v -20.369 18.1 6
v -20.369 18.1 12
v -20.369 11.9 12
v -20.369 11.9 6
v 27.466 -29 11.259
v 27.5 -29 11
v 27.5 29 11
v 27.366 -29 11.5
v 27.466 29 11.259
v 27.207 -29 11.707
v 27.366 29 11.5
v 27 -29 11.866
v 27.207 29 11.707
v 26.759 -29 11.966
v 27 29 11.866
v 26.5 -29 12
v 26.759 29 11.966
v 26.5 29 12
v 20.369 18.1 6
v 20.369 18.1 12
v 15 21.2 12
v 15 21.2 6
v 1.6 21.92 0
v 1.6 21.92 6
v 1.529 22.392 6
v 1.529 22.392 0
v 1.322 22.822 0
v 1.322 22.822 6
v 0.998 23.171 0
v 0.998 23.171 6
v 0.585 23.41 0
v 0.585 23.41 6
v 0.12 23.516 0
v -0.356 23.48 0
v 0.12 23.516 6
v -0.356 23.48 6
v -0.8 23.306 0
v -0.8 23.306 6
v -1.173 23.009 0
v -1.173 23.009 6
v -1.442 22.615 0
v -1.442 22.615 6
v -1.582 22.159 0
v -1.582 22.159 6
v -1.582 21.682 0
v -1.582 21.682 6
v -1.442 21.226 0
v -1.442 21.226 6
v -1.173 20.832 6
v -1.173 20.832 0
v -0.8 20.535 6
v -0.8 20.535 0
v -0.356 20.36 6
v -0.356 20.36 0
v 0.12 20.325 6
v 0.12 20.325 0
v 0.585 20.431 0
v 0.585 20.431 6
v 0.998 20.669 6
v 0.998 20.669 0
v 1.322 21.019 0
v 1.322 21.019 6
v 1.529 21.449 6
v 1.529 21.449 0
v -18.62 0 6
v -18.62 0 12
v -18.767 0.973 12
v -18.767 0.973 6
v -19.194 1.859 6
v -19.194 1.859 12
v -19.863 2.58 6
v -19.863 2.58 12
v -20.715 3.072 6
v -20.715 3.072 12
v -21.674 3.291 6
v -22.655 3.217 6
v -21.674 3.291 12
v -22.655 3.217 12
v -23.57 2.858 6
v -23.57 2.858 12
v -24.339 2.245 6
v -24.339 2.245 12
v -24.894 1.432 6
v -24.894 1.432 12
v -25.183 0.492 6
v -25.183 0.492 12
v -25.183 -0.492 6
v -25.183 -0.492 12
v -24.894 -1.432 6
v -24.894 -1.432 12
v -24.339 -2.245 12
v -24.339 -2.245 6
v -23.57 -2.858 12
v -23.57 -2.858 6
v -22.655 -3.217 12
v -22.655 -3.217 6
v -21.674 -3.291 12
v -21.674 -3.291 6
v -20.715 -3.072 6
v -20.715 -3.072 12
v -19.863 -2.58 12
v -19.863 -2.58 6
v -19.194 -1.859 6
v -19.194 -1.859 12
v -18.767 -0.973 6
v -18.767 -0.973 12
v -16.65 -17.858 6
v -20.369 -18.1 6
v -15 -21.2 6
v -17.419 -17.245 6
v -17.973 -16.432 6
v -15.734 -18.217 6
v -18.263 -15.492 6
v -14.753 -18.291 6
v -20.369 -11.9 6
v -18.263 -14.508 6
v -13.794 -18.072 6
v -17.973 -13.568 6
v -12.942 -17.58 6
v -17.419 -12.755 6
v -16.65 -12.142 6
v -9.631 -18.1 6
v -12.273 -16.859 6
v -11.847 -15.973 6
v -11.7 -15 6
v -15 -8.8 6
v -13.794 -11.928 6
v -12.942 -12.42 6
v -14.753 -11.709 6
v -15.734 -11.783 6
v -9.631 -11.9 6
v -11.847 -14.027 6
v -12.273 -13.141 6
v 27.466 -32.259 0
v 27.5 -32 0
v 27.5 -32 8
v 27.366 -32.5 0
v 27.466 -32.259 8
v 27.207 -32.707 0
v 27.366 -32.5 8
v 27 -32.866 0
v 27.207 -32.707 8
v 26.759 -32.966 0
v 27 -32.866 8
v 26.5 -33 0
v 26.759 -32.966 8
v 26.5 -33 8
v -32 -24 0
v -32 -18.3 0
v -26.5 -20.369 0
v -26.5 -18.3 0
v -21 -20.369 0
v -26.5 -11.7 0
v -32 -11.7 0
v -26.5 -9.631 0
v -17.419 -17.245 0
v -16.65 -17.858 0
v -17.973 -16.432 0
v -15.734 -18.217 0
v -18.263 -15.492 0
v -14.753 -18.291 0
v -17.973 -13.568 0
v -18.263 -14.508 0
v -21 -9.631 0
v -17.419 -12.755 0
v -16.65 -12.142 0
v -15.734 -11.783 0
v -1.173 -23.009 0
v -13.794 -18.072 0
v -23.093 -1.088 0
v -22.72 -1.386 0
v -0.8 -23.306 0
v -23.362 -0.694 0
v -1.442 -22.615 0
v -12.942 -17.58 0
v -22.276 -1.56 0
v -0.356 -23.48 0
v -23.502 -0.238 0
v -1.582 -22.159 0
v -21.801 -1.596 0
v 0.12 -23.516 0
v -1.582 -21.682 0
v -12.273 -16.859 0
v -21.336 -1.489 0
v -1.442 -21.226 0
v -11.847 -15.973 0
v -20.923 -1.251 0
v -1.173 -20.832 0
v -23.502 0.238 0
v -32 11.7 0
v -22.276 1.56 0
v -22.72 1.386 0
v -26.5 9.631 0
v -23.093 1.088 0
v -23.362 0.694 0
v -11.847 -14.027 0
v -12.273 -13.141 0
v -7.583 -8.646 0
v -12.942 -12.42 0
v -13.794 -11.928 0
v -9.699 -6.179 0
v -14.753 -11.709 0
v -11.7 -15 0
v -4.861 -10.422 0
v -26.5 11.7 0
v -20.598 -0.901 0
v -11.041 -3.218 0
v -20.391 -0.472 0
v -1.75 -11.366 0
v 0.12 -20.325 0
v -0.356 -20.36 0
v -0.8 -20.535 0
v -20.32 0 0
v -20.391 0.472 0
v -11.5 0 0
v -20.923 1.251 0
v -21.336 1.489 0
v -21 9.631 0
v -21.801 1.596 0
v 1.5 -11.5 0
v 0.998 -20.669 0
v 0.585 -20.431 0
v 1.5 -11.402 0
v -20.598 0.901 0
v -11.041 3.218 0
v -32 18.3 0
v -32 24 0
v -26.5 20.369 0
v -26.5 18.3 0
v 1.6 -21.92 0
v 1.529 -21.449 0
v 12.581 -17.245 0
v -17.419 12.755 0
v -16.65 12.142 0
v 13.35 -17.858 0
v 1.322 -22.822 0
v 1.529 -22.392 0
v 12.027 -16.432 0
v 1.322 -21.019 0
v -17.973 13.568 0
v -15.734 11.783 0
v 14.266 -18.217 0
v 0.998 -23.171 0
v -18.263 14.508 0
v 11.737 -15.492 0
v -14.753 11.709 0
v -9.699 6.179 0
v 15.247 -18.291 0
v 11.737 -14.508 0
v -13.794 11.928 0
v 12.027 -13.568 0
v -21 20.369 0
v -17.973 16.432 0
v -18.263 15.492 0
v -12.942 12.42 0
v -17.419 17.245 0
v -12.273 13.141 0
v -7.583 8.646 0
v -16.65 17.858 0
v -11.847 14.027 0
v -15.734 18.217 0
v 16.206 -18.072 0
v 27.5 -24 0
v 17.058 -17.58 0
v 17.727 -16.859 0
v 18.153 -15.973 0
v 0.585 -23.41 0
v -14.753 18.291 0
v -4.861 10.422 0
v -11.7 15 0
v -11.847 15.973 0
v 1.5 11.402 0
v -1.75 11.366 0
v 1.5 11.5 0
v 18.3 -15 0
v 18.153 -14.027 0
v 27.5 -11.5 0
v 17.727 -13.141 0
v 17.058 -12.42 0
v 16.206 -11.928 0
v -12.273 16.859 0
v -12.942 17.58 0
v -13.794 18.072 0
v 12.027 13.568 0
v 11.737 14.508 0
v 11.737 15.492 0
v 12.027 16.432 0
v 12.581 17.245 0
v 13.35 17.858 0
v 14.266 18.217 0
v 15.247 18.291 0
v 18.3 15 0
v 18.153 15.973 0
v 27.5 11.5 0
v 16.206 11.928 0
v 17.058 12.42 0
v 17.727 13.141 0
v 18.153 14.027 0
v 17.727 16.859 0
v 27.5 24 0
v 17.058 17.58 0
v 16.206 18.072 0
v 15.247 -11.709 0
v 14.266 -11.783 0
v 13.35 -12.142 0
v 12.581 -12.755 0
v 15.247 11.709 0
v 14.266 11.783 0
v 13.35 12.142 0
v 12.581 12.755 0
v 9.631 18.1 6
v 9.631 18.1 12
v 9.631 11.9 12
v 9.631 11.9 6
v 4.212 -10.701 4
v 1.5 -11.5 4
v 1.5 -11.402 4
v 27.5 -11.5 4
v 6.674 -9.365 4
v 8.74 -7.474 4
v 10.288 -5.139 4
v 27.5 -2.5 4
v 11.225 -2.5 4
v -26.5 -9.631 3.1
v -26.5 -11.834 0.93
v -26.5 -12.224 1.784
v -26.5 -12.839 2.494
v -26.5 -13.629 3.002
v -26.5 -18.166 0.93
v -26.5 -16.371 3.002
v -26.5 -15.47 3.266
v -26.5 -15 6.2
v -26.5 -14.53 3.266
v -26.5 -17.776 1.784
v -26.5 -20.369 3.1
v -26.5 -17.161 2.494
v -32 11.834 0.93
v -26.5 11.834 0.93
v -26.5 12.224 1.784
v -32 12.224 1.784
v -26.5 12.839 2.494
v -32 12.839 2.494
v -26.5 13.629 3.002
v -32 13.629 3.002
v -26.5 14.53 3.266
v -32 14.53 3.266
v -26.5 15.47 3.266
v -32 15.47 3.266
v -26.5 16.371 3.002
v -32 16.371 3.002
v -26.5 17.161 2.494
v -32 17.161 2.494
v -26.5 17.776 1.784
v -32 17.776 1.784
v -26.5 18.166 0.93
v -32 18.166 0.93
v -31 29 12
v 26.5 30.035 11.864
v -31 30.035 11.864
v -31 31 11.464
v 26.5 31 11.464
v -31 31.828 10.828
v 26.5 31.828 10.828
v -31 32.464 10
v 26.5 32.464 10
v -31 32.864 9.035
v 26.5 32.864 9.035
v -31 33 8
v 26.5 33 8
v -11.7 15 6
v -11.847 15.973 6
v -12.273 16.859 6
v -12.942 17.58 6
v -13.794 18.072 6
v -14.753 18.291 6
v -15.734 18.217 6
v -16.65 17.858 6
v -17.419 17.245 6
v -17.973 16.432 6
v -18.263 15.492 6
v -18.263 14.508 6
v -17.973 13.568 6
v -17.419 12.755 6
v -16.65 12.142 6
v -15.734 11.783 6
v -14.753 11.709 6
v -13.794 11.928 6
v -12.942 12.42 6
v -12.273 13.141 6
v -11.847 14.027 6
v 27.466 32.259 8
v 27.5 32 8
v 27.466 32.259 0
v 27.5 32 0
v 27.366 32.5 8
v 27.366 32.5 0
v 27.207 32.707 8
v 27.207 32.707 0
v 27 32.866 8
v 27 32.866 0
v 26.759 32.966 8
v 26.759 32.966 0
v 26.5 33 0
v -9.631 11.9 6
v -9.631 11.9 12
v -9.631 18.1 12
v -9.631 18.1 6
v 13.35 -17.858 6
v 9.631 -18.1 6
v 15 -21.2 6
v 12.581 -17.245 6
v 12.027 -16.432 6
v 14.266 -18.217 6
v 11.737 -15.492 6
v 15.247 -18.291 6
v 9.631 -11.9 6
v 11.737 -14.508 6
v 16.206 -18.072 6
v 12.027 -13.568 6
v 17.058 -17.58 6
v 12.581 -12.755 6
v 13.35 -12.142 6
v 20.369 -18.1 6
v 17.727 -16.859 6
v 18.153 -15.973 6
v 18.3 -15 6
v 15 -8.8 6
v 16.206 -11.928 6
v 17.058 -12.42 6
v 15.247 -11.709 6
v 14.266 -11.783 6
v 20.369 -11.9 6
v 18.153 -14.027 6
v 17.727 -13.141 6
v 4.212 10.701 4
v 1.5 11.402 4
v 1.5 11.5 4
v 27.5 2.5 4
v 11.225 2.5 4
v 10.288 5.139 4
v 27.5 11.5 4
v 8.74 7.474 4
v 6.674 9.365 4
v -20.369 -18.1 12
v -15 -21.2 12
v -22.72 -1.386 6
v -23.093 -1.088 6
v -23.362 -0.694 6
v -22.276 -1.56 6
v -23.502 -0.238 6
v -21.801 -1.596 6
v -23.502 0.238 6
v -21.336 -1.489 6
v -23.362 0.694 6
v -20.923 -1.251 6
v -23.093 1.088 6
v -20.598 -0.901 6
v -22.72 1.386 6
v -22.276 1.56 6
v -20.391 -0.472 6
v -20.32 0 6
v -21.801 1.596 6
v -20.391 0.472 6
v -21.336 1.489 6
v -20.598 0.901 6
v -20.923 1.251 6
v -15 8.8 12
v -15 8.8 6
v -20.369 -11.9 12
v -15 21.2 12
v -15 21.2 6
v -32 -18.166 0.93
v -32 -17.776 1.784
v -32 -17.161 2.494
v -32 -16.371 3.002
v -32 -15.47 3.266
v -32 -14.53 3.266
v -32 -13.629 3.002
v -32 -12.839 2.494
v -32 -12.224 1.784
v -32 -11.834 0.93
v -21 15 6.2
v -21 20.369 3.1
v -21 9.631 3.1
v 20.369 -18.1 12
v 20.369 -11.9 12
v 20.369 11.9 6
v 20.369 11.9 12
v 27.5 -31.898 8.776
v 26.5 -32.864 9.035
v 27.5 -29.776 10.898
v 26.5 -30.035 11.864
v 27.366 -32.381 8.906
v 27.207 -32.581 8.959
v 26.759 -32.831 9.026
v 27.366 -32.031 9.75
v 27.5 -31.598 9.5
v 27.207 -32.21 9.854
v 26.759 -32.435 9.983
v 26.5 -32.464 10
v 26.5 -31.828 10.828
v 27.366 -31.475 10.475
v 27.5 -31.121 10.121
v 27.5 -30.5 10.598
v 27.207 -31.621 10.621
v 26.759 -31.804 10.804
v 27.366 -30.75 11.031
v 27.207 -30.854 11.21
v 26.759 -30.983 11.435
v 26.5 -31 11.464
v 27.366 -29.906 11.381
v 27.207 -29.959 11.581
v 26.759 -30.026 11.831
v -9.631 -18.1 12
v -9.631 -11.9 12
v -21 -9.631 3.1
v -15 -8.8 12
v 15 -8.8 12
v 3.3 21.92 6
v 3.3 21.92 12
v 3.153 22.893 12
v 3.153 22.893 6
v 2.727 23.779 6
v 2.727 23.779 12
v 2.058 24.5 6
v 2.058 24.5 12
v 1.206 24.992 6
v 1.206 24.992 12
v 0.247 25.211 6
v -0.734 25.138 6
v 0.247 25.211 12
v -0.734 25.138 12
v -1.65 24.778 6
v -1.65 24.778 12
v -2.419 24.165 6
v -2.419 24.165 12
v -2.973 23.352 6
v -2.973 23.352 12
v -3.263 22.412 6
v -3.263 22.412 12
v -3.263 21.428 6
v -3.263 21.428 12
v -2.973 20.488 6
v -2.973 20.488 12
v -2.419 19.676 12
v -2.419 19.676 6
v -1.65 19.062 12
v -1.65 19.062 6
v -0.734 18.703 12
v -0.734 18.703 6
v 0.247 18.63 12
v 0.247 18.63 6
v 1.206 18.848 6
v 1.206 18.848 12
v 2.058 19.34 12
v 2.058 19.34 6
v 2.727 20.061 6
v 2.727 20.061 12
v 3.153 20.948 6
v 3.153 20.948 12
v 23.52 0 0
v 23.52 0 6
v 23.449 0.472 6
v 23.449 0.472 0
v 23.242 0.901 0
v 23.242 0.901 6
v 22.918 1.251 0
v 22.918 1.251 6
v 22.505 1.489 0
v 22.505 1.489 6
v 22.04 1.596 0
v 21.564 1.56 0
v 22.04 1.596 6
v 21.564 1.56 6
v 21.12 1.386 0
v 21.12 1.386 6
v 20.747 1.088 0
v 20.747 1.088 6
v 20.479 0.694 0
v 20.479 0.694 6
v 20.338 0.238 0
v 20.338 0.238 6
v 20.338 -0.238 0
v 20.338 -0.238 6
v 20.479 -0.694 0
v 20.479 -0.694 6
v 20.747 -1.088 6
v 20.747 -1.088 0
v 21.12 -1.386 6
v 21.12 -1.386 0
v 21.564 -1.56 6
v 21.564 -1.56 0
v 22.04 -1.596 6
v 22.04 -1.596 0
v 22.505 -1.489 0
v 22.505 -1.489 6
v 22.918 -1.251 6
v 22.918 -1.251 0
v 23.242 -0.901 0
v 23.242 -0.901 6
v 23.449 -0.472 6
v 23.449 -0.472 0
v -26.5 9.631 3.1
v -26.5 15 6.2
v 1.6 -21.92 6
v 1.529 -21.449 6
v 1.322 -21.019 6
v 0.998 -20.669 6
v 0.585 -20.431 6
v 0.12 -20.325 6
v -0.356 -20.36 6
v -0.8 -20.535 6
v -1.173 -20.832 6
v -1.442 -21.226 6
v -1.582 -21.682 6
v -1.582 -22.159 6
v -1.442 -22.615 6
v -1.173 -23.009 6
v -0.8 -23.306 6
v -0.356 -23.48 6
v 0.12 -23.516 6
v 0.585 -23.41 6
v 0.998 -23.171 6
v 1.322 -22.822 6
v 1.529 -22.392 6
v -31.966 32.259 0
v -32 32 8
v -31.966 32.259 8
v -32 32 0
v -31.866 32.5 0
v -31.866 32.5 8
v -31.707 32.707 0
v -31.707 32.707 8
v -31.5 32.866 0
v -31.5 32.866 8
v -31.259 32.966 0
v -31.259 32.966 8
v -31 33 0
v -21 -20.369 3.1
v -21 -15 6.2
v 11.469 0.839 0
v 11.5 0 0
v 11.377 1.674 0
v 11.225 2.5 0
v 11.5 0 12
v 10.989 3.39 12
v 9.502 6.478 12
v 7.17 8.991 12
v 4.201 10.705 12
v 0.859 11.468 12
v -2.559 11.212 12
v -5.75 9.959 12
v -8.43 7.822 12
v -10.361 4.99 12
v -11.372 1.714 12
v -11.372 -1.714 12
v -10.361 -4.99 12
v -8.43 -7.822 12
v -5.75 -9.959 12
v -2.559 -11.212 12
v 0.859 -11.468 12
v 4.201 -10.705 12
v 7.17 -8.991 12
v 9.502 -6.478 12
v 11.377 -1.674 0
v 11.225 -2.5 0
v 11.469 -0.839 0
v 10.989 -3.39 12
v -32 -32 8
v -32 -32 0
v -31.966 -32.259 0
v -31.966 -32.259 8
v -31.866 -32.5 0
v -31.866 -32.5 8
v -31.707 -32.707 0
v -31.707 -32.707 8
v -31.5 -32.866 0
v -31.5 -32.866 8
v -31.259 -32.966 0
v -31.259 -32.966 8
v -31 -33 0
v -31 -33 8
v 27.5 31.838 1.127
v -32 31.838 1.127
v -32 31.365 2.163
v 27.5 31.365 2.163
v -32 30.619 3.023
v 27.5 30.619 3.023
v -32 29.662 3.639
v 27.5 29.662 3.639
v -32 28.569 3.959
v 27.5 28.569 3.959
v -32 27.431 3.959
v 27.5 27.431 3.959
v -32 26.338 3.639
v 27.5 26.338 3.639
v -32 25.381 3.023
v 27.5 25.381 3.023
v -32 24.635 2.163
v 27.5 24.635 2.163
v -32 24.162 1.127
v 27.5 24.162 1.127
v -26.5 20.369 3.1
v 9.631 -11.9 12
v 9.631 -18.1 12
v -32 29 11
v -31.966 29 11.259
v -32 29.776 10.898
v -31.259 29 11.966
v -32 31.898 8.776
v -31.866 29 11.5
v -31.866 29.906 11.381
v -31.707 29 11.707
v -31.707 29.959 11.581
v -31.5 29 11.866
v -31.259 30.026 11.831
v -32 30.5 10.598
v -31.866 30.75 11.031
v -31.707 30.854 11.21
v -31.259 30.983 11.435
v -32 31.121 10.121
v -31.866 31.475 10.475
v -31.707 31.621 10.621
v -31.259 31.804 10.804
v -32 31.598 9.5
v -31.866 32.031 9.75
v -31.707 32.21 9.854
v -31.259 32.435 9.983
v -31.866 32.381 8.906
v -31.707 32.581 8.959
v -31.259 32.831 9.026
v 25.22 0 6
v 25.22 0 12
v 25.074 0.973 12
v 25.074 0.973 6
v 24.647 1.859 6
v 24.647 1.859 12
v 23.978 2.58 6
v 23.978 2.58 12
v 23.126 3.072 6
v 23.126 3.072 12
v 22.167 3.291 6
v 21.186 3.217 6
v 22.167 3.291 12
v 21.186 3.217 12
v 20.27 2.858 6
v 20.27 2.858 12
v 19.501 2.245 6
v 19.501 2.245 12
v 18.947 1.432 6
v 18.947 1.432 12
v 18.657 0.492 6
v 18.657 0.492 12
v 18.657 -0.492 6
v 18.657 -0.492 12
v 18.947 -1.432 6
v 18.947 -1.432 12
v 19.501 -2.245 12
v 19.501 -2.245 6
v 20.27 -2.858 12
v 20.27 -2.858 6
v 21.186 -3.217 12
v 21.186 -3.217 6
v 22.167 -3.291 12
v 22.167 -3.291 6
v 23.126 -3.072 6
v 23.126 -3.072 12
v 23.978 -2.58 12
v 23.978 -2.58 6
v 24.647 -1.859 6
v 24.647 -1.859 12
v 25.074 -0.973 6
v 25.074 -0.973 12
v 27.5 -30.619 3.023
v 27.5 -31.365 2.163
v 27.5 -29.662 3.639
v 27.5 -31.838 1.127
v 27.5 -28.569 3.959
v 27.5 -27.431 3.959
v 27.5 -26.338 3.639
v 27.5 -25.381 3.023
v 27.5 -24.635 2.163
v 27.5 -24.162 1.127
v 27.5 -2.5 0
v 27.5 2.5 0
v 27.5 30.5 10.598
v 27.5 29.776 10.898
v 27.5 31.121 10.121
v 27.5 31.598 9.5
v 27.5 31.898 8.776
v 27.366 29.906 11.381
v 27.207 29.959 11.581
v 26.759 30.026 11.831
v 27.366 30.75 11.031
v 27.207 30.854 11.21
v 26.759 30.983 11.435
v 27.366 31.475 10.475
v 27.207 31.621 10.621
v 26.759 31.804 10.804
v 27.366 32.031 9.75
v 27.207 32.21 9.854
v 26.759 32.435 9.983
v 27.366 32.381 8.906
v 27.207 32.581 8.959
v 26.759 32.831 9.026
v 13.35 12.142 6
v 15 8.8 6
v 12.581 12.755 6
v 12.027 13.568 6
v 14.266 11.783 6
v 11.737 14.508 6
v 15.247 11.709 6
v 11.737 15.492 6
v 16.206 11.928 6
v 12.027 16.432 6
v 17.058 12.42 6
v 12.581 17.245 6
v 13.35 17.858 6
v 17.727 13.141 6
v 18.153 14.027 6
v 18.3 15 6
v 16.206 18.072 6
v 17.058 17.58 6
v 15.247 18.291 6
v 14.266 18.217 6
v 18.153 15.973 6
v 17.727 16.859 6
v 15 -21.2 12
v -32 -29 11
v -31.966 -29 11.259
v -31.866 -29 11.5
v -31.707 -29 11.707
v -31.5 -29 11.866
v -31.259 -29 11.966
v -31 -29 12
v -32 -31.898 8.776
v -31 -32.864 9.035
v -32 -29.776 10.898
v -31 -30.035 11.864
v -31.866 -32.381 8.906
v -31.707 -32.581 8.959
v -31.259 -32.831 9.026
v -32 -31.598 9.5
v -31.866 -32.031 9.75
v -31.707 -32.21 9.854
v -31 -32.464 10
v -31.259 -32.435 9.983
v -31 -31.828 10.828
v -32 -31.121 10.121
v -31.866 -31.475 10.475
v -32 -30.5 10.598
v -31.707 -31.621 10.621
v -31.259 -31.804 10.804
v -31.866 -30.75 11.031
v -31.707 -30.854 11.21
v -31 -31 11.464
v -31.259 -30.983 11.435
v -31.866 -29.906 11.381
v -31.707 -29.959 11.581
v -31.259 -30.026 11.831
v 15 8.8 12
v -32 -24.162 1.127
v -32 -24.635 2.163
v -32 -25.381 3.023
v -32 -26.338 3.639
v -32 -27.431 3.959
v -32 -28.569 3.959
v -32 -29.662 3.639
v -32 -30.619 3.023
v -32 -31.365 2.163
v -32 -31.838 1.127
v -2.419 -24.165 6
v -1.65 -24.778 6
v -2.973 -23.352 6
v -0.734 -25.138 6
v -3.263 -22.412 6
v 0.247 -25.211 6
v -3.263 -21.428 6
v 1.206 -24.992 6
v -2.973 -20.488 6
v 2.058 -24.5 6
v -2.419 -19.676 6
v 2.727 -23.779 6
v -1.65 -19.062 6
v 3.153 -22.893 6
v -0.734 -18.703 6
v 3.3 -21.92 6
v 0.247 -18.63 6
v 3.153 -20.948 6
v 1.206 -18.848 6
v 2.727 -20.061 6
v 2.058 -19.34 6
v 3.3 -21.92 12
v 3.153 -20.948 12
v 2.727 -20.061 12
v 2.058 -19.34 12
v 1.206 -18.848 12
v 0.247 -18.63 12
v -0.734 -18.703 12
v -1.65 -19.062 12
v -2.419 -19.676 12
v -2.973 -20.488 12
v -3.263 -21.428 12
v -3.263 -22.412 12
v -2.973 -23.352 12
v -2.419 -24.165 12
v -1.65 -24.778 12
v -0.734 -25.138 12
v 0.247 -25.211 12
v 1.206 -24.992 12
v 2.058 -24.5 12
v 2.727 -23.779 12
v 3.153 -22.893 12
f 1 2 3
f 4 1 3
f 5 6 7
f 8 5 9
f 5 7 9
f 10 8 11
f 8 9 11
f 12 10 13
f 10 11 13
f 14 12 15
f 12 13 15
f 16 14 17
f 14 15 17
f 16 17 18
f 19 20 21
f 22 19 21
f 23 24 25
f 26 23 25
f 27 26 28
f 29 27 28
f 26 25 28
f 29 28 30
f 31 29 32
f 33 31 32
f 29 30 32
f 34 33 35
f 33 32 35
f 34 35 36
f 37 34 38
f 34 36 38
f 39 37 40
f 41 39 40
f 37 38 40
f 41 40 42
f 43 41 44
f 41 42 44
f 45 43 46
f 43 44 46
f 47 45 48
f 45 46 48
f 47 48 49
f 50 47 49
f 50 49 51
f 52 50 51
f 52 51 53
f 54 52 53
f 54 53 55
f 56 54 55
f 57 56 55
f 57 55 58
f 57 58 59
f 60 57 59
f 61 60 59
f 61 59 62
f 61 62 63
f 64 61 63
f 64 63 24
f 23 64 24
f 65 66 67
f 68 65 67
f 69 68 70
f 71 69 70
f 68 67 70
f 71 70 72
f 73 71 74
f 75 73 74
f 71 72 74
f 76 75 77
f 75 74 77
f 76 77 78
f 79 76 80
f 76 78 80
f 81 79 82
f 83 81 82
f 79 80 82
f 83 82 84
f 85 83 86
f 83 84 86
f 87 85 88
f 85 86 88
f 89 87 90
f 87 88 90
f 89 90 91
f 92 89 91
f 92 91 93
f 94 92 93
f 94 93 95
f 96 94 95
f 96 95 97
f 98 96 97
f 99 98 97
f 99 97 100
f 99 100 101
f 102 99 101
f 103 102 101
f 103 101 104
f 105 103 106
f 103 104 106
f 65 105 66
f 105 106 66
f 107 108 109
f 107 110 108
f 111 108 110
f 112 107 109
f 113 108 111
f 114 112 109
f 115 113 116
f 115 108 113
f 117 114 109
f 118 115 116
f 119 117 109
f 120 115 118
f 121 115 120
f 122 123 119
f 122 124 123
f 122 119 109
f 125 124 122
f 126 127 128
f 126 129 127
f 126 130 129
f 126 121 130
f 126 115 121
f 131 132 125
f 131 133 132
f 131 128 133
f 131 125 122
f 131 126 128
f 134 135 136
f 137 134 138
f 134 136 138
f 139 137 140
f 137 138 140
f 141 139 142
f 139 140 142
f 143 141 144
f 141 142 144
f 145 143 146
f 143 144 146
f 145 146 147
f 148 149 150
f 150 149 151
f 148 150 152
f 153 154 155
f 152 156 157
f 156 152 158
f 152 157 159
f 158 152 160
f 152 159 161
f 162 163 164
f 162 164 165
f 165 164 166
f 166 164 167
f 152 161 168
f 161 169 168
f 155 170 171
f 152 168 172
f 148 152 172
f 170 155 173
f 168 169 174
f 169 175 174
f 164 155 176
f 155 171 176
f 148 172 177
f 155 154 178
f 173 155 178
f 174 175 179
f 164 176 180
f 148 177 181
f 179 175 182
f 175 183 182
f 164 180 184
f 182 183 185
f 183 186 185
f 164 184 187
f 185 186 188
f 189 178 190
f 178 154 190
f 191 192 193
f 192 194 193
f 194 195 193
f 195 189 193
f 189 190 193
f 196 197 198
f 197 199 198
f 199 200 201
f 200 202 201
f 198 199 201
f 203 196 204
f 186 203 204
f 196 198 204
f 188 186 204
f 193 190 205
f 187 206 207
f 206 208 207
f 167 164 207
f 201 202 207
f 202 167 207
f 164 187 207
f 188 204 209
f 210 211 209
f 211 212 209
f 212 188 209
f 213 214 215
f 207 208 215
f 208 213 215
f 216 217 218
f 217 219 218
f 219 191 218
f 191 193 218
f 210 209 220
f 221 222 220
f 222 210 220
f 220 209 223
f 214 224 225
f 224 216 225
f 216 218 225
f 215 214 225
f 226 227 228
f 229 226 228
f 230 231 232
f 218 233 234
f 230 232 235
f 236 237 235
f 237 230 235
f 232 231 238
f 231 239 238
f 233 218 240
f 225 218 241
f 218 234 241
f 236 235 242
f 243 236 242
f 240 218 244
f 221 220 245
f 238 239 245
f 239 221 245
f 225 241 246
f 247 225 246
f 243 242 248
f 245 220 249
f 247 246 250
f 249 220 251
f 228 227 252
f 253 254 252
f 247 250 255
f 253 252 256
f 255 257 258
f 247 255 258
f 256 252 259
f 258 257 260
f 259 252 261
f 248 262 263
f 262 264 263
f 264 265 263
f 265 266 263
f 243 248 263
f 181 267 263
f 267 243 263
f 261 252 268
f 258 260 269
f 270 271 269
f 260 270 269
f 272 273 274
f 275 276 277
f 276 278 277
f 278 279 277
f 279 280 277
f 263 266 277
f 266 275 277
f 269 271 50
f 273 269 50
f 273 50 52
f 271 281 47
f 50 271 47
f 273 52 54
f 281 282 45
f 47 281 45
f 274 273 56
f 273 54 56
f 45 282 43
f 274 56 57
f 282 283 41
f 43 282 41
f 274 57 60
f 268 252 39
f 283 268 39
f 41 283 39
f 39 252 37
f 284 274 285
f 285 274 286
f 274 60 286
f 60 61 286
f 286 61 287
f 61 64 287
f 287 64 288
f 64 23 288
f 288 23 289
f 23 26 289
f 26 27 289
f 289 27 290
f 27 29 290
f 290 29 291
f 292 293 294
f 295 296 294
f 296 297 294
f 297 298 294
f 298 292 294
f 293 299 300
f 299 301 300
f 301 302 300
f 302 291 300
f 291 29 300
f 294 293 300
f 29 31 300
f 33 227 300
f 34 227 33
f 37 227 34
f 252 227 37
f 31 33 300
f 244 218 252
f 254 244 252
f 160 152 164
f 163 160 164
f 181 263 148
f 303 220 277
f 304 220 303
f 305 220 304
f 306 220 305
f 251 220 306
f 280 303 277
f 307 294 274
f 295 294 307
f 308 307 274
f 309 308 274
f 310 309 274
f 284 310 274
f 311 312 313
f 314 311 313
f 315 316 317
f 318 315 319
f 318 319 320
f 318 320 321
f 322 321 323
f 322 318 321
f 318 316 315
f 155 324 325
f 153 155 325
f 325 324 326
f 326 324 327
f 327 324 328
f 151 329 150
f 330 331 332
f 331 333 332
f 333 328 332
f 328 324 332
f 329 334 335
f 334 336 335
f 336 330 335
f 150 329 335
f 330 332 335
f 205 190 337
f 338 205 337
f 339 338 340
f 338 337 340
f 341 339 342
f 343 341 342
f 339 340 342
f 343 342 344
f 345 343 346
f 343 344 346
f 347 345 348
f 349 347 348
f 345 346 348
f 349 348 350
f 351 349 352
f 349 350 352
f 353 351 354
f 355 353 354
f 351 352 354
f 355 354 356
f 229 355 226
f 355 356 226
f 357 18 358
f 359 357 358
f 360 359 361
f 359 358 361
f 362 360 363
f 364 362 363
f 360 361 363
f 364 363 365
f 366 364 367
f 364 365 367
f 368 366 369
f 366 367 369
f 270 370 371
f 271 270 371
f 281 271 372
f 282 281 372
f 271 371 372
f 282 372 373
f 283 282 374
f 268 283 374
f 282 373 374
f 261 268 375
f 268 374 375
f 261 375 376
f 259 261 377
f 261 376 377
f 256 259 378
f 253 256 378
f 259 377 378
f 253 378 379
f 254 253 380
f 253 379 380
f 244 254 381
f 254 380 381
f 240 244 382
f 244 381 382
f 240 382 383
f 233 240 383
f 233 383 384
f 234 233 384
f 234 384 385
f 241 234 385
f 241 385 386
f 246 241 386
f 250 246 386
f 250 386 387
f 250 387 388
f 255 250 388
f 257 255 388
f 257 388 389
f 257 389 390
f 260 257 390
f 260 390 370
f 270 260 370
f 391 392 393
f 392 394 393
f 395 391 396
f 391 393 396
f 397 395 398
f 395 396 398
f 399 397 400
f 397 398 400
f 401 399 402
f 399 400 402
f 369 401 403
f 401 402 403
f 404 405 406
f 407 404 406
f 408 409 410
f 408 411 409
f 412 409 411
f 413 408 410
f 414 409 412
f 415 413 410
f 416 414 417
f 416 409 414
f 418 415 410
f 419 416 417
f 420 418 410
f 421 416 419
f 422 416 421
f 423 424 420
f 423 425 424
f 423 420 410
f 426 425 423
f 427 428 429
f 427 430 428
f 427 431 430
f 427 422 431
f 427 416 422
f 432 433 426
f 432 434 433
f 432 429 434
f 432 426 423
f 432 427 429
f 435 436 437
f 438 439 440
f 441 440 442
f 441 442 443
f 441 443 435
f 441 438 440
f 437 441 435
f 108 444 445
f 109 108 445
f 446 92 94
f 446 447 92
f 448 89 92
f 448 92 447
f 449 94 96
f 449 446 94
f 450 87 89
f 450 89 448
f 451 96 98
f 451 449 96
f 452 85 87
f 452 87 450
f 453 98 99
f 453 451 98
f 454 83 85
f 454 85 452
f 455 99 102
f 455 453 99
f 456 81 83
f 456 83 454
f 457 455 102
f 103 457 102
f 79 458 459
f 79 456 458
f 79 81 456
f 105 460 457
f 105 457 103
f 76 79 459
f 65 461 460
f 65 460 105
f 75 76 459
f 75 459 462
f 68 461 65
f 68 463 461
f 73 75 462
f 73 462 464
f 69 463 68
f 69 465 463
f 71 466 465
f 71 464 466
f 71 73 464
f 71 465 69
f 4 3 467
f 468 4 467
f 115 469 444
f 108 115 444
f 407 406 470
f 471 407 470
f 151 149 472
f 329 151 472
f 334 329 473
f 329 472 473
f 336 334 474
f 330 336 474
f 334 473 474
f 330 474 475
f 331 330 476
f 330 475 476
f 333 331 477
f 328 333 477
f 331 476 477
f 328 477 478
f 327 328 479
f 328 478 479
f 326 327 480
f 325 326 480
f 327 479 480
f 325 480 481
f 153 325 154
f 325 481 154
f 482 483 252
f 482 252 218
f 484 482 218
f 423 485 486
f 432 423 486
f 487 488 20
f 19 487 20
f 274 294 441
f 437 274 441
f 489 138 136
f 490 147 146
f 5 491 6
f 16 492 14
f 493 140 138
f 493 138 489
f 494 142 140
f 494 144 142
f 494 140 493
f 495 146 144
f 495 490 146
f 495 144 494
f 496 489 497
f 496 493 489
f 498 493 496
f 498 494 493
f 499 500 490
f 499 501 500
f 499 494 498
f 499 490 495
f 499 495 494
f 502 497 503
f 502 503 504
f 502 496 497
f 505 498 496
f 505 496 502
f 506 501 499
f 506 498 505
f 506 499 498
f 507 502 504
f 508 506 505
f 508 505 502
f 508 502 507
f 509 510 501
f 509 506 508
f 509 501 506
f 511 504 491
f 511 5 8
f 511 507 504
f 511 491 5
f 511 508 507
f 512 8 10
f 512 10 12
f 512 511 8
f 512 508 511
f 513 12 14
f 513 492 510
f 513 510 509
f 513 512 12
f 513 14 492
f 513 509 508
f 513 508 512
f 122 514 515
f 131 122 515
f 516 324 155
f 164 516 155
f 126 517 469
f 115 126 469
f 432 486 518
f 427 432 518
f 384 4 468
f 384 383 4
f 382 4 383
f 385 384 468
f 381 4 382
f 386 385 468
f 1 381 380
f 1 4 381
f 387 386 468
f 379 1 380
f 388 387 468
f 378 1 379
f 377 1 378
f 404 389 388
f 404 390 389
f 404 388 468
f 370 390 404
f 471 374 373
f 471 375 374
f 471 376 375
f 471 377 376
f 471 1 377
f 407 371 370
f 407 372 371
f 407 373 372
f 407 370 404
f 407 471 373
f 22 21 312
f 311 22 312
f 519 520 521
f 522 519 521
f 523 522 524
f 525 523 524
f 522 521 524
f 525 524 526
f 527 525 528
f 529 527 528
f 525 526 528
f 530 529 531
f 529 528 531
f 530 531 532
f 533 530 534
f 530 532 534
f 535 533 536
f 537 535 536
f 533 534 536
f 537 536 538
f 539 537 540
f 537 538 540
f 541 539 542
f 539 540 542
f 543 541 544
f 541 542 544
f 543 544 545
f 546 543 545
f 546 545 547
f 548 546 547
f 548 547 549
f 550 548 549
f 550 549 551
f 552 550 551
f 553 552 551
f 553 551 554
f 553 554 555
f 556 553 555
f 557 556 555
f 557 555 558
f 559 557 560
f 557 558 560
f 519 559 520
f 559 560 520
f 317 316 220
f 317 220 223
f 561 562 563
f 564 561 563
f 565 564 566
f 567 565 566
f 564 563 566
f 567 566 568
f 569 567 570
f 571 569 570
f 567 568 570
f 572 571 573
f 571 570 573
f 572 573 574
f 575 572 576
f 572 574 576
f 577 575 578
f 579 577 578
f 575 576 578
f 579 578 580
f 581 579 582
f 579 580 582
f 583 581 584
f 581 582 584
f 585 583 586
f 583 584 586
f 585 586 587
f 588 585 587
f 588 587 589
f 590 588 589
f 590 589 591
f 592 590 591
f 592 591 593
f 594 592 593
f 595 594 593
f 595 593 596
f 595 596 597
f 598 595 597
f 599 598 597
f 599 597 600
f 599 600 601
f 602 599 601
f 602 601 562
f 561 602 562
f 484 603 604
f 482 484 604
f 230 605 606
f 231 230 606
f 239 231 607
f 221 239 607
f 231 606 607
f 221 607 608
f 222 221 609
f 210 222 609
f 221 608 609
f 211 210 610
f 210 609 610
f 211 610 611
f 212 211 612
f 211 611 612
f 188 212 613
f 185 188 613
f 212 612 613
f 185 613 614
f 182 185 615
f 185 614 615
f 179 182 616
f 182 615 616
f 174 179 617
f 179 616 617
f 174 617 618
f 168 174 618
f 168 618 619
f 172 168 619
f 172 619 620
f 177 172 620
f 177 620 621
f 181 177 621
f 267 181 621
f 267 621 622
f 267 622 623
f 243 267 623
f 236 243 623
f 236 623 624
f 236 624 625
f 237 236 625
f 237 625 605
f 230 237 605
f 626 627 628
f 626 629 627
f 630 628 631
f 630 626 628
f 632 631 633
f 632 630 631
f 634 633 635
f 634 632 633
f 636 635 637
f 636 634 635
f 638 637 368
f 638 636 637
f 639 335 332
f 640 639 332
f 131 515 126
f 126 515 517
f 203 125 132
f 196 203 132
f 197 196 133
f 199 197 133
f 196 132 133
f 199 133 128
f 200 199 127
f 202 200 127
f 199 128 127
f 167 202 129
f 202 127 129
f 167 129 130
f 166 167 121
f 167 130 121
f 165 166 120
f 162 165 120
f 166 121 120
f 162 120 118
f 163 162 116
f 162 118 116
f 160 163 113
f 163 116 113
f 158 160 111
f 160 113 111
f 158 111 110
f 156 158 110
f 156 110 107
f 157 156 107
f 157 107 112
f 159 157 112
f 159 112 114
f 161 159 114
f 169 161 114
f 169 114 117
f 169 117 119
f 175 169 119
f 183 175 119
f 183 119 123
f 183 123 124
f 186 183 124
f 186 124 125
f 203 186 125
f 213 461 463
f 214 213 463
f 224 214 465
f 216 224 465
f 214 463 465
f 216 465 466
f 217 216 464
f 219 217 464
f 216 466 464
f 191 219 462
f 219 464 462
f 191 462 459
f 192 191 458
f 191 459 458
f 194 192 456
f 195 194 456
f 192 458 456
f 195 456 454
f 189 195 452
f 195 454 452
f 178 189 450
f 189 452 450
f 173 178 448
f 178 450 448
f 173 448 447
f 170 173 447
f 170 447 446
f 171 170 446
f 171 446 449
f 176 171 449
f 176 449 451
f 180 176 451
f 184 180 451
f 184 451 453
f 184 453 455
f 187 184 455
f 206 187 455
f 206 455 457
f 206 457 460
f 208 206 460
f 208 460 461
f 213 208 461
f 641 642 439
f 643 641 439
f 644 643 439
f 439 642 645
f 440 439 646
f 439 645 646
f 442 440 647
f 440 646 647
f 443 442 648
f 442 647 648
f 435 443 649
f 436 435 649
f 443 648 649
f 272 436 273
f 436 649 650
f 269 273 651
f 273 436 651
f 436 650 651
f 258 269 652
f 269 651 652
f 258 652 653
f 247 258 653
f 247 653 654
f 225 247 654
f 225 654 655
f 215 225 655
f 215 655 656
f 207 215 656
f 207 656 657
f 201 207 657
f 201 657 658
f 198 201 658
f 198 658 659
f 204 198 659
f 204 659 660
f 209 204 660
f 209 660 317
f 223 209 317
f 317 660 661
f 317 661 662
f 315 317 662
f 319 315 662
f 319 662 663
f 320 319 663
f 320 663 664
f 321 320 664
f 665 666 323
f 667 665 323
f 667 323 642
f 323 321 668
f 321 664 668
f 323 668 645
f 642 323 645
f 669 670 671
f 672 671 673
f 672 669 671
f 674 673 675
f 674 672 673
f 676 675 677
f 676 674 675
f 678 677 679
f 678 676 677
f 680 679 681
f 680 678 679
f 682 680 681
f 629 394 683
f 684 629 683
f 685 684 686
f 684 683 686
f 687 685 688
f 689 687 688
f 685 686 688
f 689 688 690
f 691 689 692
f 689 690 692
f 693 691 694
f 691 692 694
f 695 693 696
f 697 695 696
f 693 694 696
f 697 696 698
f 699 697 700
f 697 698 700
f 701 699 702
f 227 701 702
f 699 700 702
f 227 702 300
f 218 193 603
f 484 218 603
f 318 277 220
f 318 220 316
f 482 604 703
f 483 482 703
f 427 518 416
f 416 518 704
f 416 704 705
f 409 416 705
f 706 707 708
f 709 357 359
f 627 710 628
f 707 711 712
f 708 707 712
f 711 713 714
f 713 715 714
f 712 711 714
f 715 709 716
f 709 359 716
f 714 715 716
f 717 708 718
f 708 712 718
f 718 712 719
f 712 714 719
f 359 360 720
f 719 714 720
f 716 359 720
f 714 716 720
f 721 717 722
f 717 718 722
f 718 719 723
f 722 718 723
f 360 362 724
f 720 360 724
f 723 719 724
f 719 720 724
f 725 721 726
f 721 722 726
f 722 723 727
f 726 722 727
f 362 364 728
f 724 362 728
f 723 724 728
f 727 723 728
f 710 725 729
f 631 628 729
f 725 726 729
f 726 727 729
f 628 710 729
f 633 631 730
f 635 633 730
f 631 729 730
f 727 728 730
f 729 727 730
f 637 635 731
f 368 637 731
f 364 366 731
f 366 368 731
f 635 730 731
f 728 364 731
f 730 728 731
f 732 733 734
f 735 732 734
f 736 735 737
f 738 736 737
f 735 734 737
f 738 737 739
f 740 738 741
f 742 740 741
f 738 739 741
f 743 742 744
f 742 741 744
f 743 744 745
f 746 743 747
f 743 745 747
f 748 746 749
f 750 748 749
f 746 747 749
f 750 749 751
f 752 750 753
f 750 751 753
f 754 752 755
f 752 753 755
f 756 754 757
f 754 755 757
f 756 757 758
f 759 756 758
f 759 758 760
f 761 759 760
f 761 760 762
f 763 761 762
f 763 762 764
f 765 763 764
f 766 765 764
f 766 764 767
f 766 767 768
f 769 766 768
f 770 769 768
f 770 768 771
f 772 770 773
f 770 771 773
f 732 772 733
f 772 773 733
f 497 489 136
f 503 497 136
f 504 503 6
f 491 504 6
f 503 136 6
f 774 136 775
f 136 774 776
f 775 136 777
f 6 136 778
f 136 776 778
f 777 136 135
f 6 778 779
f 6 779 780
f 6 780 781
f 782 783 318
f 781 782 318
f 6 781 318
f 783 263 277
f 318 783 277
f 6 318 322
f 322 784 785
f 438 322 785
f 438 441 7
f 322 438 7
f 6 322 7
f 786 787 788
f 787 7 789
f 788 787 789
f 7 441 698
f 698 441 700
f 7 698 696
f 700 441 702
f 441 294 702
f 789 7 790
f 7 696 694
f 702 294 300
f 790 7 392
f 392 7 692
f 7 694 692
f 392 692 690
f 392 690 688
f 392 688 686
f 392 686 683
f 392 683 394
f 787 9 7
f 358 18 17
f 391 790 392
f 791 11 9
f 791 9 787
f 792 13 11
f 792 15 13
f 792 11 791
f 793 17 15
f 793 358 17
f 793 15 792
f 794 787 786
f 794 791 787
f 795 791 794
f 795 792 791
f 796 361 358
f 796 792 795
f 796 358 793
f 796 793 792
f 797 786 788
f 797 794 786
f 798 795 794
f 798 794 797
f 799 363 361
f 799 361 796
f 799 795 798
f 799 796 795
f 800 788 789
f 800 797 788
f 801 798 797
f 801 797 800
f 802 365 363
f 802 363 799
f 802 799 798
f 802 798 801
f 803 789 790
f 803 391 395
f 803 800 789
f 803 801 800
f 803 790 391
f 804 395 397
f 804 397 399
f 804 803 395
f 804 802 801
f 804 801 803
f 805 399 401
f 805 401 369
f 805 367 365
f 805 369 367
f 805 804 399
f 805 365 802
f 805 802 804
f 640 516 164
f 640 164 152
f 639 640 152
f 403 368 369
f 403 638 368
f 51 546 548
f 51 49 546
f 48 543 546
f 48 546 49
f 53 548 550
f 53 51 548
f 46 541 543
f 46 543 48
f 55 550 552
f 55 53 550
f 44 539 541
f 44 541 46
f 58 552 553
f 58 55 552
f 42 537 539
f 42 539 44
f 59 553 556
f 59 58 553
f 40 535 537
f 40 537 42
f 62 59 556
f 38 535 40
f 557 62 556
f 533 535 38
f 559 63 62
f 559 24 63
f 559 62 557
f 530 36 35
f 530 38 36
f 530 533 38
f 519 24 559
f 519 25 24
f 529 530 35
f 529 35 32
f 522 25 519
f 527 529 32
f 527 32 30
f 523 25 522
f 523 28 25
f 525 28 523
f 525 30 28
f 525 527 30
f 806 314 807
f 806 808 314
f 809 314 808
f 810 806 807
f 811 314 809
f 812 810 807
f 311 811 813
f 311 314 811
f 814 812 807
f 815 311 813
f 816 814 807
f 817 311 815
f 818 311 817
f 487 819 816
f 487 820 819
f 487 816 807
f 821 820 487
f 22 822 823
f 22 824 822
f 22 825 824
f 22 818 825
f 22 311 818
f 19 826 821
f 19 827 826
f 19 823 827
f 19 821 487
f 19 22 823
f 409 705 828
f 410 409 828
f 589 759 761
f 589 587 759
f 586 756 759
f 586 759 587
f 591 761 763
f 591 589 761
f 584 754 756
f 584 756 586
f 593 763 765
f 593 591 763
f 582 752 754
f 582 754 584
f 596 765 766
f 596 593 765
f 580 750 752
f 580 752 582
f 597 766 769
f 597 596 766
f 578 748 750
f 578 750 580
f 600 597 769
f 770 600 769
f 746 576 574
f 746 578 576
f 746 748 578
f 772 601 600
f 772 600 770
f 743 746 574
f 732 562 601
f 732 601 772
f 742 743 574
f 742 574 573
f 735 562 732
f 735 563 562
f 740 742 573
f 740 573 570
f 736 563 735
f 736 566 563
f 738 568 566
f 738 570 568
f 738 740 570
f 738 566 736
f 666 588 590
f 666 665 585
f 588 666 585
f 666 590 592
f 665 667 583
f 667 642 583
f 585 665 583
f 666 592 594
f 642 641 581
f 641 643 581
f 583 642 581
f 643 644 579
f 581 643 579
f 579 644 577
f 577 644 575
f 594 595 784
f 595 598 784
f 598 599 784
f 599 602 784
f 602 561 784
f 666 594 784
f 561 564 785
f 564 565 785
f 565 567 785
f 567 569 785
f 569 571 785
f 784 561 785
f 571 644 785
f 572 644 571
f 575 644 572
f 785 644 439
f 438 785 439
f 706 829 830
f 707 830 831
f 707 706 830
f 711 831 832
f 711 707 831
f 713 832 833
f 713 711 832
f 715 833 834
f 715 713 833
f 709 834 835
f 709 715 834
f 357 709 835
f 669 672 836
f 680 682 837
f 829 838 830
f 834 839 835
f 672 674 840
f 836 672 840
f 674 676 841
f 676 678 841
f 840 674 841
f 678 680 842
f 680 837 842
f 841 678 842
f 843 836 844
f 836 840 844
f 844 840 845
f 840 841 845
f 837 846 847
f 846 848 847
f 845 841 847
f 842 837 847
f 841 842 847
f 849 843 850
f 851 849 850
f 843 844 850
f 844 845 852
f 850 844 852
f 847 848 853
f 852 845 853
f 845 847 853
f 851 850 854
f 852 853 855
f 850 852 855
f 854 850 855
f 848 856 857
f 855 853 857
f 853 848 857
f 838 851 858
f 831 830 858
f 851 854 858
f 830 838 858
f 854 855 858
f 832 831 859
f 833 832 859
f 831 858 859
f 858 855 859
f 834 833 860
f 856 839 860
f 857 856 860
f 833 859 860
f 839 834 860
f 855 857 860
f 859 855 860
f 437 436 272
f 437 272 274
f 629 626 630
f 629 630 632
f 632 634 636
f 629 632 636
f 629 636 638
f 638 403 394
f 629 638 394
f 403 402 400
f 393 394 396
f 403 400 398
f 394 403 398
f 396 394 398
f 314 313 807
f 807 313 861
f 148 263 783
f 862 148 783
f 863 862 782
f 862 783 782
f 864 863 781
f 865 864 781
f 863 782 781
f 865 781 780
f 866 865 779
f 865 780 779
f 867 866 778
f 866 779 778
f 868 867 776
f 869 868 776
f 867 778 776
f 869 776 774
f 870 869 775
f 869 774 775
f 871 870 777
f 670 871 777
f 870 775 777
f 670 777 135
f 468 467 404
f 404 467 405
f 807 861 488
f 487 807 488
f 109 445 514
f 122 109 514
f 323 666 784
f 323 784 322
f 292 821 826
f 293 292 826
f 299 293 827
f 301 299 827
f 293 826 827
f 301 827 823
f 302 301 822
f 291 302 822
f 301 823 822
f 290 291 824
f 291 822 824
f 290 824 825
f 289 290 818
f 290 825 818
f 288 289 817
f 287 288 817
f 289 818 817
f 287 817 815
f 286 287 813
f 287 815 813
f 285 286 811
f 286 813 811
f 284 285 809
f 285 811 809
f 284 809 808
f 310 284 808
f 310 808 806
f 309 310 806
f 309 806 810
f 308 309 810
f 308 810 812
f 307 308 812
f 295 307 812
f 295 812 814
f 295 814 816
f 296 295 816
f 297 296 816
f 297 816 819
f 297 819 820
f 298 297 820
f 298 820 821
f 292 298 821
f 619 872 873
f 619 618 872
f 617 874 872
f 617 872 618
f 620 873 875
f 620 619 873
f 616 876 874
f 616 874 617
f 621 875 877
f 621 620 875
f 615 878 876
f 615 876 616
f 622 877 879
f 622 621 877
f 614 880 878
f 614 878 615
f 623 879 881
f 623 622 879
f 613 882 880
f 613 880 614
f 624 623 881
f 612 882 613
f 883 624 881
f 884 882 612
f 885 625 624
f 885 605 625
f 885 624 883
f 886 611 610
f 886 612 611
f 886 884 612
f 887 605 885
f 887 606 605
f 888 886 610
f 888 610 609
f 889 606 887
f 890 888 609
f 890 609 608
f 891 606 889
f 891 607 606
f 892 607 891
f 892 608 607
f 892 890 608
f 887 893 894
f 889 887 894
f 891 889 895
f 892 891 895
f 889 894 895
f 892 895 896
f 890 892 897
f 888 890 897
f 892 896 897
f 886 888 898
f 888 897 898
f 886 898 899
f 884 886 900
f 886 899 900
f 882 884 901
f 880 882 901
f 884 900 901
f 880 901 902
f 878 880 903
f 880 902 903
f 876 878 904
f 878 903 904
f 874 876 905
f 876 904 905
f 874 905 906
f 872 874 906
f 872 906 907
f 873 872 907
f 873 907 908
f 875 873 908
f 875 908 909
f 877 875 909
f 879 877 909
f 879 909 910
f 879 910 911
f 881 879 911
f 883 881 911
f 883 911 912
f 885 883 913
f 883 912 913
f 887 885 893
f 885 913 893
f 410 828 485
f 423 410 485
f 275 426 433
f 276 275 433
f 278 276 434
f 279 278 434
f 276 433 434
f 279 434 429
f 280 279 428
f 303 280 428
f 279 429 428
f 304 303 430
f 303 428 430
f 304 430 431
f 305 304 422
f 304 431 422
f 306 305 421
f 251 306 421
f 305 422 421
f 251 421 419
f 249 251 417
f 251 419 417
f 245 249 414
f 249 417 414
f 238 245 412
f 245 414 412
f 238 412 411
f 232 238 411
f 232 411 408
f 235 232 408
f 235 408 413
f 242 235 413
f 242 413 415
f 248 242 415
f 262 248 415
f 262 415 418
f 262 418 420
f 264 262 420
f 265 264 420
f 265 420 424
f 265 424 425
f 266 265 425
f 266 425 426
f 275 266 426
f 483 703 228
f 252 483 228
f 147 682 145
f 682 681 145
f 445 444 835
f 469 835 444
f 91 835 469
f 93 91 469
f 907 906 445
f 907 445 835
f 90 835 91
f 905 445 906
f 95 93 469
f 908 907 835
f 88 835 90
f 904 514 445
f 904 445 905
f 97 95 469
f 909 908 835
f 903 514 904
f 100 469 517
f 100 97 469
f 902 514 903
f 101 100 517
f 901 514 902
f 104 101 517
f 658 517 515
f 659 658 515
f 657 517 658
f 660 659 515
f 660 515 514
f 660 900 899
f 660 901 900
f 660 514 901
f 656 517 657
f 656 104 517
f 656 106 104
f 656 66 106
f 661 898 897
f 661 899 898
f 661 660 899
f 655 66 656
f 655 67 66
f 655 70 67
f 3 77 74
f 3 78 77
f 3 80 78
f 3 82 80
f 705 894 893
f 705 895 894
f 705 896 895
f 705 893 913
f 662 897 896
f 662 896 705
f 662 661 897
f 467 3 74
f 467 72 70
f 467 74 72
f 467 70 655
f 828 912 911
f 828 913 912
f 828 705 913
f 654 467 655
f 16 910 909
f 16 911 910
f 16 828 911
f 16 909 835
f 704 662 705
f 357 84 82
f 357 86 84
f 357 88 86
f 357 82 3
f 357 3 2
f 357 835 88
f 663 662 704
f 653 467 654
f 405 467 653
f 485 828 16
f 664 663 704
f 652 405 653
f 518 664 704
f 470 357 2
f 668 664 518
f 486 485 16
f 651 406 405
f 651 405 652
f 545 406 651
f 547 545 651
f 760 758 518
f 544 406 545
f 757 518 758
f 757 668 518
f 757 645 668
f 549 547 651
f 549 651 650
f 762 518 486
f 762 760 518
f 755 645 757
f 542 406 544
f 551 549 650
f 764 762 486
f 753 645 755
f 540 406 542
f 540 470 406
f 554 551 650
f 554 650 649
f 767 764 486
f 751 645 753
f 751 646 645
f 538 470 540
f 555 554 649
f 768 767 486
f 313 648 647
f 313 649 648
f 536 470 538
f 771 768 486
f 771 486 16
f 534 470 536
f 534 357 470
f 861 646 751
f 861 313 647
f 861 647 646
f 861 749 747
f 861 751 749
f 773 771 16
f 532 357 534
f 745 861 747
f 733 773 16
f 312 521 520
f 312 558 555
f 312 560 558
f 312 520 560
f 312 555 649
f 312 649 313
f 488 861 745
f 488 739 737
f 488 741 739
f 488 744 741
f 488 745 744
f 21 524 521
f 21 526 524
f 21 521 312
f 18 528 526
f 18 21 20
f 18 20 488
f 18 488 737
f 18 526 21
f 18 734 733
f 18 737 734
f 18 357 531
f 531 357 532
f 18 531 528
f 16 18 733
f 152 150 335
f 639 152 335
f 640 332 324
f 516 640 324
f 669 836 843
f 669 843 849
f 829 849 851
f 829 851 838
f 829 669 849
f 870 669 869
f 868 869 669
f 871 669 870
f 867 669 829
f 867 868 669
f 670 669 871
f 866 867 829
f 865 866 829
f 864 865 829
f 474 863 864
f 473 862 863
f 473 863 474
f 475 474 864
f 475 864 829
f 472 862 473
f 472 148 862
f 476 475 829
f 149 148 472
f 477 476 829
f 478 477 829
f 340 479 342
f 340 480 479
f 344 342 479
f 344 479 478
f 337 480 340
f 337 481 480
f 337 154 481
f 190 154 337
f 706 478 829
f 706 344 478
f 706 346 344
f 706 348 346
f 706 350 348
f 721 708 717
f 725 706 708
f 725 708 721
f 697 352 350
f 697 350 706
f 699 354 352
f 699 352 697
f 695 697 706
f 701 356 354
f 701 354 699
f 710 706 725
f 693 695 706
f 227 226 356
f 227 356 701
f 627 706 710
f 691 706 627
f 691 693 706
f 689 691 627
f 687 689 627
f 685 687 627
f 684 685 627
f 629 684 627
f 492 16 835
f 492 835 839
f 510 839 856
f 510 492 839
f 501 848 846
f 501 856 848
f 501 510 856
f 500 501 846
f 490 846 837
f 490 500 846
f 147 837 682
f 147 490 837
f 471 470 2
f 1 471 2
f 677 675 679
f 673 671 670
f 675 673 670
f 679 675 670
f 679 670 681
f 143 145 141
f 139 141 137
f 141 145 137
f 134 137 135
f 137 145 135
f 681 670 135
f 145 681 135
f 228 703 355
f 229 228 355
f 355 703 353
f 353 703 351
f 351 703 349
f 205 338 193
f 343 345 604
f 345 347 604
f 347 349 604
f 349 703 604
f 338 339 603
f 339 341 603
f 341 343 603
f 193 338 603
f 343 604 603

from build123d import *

# Parameters (mm, degrees)
SKETCH_W        = 59.5
SKETCH_H        = 66
PAD_DEPTH       = 12
SKETCH001_R     = 3.3
POCKET_DEPTH    = 6
SKETCH002_R     = 3.3
SKETCH002_R_2   = 1.6
POCKET001_DEPTH = 6.001
SKETCH003_R     = 4
POCKET002_DEPTH = 59.501
SKETCH004_R     = 3.3
POCKET003_DEPTH = 5.5
POCKET004_DEPTH = 5.5
SKETCH006_R     = 11.5
POCKET005_DEPTH = 12.001
SKETCH007_W     = 9
SKETCH007_H     = 4
POCKET006_DEPTH = 26
FILLET_R        = 4
FILLET001_R     = 4
FILLET002_R     = 1
FILLET003_R     = 1


with BuildPart() as part:
    # Sketch → Pad (new body)
    with BuildSketch(Plane.XY):
        with Locations((-2.25, 0)):
            Rectangle(SKETCH_W, SKETCH_H)
    extrude(amount=PAD_DEPTH)

    # Sketch001 (on Face6 of Pad) → Pocket (cut)
    with BuildSketch(Plane.XY.offset(12)):
        with Locations((0, 21.92031)):
            Circle(SKETCH001_R)
        with Locations((-21.92031, 0)):
            Circle(SKETCH001_R)
        with Locations((21.92031, 0)):
            Circle(SKETCH001_R)
        with Locations((0, -21.92031)):
            Circle(SKETCH001_R)
        Polygon((-9.630642, 18.1), (-15, 21.2), (-20.369358, 18.1), (-20.369358, 11.9), (-15, 8.8), (-9.630642, 11.9), align=None)
        Polygon((20.369358, 18.1), (15, 21.2), (9.630642, 18.1), (9.630642, 11.9), (15, 8.8), (20.369358, 11.9), align=None)
        Polygon((-20.369358, -18.1), (-15, -21.2), (-9.630642, -18.1), (-9.630642, -11.9), (-15, -8.8), (-20.369358, -11.9), align=None)
        Polygon((20.369358, -11.9), (15, -8.8), (9.630642, -11.9), (9.630642, -18.1), (15, -21.2), (20.369358, -18.1), align=None)
    extrude(amount=-POCKET_DEPTH, mode=Mode.SUBTRACT)

    # Sketch002 (on Face41 of Pocket) → Pocket001 (cut, through all)
    with BuildSketch(Plane.XY.offset(6)):
        with Locations((-15, 15)):
            Circle(SKETCH002_R)
        with Locations((0, 21.92031)):
            Circle(SKETCH002_R_2)
        with Locations((15, 15)):
            Circle(SKETCH002_R)
        with Locations((-15, -15)):
            Circle(SKETCH002_R)
        with Locations((15, -15)):
            Circle(SKETCH002_R)
        with Locations((0, -21.92031)):
            Circle(SKETCH002_R_2)
        with Locations((21.92031, 0)):
            Circle(SKETCH002_R_2)
        with Locations((-21.92031, 0)):
            Circle(SKETCH002_R_2)
    extrude(amount=-POCKET001_DEPTH, mode=Mode.SUBTRACT)

    # Sketch003 (on Face3 of Pocket001) → Pocket002 (cut, through all)
    with BuildSketch(Plane.YZ.offset(27.5)):
        with Locations((-28, 0)):
            Circle(SKETCH003_R)
        with Locations((28, 0)):
            Circle(SKETCH003_R)
    extrude(amount=-POCKET002_DEPTH, mode=Mode.SUBTRACT)

    # Sketch004 (on Face2 of Pocket002) → Pocket003 (cut)
    with BuildSketch(Plane(origin=(-32, 0, 0), x_dir=(0, -1, 0), z_dir=(-1, 0, 0))):
        with Locations((-15, 0)):
            Circle(SKETCH004_R)
        with Locations((15, 0)):
            Circle(SKETCH004_R)
    extrude(amount=-POCKET003_DEPTH, mode=Mode.SUBTRACT)

    # Sketch005 (on Face42 of Pocket003) → Pocket004 (cut)
    with BuildSketch(Plane(origin=(-26.5, 0, 0), x_dir=(0, -1, 0), z_dir=(-1, 0, 0))):
        Polygon((-9.630642, 3.1), (-15, 6.2), (-20.369358, 3.1), (-20.369358, -3.1), (-15, -6.2), (-9.630642, -3.1), align=None)
        Polygon((9.630642, -3.1), (15, -6.2), (20.369358, -3.1), (20.369358, 3.1), (15, 6.2), (9.630642, 3.1), align=None)
    extrude(amount=-POCKET004_DEPTH, mode=Mode.SUBTRACT)

    # Sketch006 (on Face5 of Pocket004) → Pocket005 (cut, through all)
    with BuildSketch(Plane.XY.offset(12)):
        Circle(SKETCH006_R)
    extrude(amount=-POCKET005_DEPTH, mode=Mode.SUBTRACT)

    # Sketch007 (on Face3 of Pocket005) → Pocket006 (cut)
    with BuildSketch(Plane.YZ.offset(27.5)):
        with Locations((-7, 2)):
            Rectangle(SKETCH007_W, SKETCH007_H)
        with Locations((7, 2)):
            Rectangle(SKETCH007_W, SKETCH007_H)
    extrude(amount=-POCKET006_DEPTH, mode=Mode.SUBTRACT)

    # Fillet
    fillet_edges = [part.edges().sort_by_distance(p)[0] for p in [
        (-2.25, -33, 12),
    ]]
    fillet(fillet_edges, radius=FILLET_R)

    # Fillet001
    fillet001_edges = [part.edges().sort_by_distance(p)[0] for p in [
        (-2.25, 33, 12),
    ]]
    fillet(fillet001_edges, radius=FILLET001_R)

    # Fillet002
    fillet002_edges = [part.edges().sort_by_distance(p)[0] for p in [
        (-32, 0, 12),
    ]]
    fillet(fillet002_edges, radius=FILLET002_R)

    # Fillet003
    fillet003_edges = [part.edges().sort_by_distance(p)[0] for p in [
        (27.5, 0, 12),
    ]]
    fillet(fillet003_edges, radius=FILLET003_R)


solid = part.part
